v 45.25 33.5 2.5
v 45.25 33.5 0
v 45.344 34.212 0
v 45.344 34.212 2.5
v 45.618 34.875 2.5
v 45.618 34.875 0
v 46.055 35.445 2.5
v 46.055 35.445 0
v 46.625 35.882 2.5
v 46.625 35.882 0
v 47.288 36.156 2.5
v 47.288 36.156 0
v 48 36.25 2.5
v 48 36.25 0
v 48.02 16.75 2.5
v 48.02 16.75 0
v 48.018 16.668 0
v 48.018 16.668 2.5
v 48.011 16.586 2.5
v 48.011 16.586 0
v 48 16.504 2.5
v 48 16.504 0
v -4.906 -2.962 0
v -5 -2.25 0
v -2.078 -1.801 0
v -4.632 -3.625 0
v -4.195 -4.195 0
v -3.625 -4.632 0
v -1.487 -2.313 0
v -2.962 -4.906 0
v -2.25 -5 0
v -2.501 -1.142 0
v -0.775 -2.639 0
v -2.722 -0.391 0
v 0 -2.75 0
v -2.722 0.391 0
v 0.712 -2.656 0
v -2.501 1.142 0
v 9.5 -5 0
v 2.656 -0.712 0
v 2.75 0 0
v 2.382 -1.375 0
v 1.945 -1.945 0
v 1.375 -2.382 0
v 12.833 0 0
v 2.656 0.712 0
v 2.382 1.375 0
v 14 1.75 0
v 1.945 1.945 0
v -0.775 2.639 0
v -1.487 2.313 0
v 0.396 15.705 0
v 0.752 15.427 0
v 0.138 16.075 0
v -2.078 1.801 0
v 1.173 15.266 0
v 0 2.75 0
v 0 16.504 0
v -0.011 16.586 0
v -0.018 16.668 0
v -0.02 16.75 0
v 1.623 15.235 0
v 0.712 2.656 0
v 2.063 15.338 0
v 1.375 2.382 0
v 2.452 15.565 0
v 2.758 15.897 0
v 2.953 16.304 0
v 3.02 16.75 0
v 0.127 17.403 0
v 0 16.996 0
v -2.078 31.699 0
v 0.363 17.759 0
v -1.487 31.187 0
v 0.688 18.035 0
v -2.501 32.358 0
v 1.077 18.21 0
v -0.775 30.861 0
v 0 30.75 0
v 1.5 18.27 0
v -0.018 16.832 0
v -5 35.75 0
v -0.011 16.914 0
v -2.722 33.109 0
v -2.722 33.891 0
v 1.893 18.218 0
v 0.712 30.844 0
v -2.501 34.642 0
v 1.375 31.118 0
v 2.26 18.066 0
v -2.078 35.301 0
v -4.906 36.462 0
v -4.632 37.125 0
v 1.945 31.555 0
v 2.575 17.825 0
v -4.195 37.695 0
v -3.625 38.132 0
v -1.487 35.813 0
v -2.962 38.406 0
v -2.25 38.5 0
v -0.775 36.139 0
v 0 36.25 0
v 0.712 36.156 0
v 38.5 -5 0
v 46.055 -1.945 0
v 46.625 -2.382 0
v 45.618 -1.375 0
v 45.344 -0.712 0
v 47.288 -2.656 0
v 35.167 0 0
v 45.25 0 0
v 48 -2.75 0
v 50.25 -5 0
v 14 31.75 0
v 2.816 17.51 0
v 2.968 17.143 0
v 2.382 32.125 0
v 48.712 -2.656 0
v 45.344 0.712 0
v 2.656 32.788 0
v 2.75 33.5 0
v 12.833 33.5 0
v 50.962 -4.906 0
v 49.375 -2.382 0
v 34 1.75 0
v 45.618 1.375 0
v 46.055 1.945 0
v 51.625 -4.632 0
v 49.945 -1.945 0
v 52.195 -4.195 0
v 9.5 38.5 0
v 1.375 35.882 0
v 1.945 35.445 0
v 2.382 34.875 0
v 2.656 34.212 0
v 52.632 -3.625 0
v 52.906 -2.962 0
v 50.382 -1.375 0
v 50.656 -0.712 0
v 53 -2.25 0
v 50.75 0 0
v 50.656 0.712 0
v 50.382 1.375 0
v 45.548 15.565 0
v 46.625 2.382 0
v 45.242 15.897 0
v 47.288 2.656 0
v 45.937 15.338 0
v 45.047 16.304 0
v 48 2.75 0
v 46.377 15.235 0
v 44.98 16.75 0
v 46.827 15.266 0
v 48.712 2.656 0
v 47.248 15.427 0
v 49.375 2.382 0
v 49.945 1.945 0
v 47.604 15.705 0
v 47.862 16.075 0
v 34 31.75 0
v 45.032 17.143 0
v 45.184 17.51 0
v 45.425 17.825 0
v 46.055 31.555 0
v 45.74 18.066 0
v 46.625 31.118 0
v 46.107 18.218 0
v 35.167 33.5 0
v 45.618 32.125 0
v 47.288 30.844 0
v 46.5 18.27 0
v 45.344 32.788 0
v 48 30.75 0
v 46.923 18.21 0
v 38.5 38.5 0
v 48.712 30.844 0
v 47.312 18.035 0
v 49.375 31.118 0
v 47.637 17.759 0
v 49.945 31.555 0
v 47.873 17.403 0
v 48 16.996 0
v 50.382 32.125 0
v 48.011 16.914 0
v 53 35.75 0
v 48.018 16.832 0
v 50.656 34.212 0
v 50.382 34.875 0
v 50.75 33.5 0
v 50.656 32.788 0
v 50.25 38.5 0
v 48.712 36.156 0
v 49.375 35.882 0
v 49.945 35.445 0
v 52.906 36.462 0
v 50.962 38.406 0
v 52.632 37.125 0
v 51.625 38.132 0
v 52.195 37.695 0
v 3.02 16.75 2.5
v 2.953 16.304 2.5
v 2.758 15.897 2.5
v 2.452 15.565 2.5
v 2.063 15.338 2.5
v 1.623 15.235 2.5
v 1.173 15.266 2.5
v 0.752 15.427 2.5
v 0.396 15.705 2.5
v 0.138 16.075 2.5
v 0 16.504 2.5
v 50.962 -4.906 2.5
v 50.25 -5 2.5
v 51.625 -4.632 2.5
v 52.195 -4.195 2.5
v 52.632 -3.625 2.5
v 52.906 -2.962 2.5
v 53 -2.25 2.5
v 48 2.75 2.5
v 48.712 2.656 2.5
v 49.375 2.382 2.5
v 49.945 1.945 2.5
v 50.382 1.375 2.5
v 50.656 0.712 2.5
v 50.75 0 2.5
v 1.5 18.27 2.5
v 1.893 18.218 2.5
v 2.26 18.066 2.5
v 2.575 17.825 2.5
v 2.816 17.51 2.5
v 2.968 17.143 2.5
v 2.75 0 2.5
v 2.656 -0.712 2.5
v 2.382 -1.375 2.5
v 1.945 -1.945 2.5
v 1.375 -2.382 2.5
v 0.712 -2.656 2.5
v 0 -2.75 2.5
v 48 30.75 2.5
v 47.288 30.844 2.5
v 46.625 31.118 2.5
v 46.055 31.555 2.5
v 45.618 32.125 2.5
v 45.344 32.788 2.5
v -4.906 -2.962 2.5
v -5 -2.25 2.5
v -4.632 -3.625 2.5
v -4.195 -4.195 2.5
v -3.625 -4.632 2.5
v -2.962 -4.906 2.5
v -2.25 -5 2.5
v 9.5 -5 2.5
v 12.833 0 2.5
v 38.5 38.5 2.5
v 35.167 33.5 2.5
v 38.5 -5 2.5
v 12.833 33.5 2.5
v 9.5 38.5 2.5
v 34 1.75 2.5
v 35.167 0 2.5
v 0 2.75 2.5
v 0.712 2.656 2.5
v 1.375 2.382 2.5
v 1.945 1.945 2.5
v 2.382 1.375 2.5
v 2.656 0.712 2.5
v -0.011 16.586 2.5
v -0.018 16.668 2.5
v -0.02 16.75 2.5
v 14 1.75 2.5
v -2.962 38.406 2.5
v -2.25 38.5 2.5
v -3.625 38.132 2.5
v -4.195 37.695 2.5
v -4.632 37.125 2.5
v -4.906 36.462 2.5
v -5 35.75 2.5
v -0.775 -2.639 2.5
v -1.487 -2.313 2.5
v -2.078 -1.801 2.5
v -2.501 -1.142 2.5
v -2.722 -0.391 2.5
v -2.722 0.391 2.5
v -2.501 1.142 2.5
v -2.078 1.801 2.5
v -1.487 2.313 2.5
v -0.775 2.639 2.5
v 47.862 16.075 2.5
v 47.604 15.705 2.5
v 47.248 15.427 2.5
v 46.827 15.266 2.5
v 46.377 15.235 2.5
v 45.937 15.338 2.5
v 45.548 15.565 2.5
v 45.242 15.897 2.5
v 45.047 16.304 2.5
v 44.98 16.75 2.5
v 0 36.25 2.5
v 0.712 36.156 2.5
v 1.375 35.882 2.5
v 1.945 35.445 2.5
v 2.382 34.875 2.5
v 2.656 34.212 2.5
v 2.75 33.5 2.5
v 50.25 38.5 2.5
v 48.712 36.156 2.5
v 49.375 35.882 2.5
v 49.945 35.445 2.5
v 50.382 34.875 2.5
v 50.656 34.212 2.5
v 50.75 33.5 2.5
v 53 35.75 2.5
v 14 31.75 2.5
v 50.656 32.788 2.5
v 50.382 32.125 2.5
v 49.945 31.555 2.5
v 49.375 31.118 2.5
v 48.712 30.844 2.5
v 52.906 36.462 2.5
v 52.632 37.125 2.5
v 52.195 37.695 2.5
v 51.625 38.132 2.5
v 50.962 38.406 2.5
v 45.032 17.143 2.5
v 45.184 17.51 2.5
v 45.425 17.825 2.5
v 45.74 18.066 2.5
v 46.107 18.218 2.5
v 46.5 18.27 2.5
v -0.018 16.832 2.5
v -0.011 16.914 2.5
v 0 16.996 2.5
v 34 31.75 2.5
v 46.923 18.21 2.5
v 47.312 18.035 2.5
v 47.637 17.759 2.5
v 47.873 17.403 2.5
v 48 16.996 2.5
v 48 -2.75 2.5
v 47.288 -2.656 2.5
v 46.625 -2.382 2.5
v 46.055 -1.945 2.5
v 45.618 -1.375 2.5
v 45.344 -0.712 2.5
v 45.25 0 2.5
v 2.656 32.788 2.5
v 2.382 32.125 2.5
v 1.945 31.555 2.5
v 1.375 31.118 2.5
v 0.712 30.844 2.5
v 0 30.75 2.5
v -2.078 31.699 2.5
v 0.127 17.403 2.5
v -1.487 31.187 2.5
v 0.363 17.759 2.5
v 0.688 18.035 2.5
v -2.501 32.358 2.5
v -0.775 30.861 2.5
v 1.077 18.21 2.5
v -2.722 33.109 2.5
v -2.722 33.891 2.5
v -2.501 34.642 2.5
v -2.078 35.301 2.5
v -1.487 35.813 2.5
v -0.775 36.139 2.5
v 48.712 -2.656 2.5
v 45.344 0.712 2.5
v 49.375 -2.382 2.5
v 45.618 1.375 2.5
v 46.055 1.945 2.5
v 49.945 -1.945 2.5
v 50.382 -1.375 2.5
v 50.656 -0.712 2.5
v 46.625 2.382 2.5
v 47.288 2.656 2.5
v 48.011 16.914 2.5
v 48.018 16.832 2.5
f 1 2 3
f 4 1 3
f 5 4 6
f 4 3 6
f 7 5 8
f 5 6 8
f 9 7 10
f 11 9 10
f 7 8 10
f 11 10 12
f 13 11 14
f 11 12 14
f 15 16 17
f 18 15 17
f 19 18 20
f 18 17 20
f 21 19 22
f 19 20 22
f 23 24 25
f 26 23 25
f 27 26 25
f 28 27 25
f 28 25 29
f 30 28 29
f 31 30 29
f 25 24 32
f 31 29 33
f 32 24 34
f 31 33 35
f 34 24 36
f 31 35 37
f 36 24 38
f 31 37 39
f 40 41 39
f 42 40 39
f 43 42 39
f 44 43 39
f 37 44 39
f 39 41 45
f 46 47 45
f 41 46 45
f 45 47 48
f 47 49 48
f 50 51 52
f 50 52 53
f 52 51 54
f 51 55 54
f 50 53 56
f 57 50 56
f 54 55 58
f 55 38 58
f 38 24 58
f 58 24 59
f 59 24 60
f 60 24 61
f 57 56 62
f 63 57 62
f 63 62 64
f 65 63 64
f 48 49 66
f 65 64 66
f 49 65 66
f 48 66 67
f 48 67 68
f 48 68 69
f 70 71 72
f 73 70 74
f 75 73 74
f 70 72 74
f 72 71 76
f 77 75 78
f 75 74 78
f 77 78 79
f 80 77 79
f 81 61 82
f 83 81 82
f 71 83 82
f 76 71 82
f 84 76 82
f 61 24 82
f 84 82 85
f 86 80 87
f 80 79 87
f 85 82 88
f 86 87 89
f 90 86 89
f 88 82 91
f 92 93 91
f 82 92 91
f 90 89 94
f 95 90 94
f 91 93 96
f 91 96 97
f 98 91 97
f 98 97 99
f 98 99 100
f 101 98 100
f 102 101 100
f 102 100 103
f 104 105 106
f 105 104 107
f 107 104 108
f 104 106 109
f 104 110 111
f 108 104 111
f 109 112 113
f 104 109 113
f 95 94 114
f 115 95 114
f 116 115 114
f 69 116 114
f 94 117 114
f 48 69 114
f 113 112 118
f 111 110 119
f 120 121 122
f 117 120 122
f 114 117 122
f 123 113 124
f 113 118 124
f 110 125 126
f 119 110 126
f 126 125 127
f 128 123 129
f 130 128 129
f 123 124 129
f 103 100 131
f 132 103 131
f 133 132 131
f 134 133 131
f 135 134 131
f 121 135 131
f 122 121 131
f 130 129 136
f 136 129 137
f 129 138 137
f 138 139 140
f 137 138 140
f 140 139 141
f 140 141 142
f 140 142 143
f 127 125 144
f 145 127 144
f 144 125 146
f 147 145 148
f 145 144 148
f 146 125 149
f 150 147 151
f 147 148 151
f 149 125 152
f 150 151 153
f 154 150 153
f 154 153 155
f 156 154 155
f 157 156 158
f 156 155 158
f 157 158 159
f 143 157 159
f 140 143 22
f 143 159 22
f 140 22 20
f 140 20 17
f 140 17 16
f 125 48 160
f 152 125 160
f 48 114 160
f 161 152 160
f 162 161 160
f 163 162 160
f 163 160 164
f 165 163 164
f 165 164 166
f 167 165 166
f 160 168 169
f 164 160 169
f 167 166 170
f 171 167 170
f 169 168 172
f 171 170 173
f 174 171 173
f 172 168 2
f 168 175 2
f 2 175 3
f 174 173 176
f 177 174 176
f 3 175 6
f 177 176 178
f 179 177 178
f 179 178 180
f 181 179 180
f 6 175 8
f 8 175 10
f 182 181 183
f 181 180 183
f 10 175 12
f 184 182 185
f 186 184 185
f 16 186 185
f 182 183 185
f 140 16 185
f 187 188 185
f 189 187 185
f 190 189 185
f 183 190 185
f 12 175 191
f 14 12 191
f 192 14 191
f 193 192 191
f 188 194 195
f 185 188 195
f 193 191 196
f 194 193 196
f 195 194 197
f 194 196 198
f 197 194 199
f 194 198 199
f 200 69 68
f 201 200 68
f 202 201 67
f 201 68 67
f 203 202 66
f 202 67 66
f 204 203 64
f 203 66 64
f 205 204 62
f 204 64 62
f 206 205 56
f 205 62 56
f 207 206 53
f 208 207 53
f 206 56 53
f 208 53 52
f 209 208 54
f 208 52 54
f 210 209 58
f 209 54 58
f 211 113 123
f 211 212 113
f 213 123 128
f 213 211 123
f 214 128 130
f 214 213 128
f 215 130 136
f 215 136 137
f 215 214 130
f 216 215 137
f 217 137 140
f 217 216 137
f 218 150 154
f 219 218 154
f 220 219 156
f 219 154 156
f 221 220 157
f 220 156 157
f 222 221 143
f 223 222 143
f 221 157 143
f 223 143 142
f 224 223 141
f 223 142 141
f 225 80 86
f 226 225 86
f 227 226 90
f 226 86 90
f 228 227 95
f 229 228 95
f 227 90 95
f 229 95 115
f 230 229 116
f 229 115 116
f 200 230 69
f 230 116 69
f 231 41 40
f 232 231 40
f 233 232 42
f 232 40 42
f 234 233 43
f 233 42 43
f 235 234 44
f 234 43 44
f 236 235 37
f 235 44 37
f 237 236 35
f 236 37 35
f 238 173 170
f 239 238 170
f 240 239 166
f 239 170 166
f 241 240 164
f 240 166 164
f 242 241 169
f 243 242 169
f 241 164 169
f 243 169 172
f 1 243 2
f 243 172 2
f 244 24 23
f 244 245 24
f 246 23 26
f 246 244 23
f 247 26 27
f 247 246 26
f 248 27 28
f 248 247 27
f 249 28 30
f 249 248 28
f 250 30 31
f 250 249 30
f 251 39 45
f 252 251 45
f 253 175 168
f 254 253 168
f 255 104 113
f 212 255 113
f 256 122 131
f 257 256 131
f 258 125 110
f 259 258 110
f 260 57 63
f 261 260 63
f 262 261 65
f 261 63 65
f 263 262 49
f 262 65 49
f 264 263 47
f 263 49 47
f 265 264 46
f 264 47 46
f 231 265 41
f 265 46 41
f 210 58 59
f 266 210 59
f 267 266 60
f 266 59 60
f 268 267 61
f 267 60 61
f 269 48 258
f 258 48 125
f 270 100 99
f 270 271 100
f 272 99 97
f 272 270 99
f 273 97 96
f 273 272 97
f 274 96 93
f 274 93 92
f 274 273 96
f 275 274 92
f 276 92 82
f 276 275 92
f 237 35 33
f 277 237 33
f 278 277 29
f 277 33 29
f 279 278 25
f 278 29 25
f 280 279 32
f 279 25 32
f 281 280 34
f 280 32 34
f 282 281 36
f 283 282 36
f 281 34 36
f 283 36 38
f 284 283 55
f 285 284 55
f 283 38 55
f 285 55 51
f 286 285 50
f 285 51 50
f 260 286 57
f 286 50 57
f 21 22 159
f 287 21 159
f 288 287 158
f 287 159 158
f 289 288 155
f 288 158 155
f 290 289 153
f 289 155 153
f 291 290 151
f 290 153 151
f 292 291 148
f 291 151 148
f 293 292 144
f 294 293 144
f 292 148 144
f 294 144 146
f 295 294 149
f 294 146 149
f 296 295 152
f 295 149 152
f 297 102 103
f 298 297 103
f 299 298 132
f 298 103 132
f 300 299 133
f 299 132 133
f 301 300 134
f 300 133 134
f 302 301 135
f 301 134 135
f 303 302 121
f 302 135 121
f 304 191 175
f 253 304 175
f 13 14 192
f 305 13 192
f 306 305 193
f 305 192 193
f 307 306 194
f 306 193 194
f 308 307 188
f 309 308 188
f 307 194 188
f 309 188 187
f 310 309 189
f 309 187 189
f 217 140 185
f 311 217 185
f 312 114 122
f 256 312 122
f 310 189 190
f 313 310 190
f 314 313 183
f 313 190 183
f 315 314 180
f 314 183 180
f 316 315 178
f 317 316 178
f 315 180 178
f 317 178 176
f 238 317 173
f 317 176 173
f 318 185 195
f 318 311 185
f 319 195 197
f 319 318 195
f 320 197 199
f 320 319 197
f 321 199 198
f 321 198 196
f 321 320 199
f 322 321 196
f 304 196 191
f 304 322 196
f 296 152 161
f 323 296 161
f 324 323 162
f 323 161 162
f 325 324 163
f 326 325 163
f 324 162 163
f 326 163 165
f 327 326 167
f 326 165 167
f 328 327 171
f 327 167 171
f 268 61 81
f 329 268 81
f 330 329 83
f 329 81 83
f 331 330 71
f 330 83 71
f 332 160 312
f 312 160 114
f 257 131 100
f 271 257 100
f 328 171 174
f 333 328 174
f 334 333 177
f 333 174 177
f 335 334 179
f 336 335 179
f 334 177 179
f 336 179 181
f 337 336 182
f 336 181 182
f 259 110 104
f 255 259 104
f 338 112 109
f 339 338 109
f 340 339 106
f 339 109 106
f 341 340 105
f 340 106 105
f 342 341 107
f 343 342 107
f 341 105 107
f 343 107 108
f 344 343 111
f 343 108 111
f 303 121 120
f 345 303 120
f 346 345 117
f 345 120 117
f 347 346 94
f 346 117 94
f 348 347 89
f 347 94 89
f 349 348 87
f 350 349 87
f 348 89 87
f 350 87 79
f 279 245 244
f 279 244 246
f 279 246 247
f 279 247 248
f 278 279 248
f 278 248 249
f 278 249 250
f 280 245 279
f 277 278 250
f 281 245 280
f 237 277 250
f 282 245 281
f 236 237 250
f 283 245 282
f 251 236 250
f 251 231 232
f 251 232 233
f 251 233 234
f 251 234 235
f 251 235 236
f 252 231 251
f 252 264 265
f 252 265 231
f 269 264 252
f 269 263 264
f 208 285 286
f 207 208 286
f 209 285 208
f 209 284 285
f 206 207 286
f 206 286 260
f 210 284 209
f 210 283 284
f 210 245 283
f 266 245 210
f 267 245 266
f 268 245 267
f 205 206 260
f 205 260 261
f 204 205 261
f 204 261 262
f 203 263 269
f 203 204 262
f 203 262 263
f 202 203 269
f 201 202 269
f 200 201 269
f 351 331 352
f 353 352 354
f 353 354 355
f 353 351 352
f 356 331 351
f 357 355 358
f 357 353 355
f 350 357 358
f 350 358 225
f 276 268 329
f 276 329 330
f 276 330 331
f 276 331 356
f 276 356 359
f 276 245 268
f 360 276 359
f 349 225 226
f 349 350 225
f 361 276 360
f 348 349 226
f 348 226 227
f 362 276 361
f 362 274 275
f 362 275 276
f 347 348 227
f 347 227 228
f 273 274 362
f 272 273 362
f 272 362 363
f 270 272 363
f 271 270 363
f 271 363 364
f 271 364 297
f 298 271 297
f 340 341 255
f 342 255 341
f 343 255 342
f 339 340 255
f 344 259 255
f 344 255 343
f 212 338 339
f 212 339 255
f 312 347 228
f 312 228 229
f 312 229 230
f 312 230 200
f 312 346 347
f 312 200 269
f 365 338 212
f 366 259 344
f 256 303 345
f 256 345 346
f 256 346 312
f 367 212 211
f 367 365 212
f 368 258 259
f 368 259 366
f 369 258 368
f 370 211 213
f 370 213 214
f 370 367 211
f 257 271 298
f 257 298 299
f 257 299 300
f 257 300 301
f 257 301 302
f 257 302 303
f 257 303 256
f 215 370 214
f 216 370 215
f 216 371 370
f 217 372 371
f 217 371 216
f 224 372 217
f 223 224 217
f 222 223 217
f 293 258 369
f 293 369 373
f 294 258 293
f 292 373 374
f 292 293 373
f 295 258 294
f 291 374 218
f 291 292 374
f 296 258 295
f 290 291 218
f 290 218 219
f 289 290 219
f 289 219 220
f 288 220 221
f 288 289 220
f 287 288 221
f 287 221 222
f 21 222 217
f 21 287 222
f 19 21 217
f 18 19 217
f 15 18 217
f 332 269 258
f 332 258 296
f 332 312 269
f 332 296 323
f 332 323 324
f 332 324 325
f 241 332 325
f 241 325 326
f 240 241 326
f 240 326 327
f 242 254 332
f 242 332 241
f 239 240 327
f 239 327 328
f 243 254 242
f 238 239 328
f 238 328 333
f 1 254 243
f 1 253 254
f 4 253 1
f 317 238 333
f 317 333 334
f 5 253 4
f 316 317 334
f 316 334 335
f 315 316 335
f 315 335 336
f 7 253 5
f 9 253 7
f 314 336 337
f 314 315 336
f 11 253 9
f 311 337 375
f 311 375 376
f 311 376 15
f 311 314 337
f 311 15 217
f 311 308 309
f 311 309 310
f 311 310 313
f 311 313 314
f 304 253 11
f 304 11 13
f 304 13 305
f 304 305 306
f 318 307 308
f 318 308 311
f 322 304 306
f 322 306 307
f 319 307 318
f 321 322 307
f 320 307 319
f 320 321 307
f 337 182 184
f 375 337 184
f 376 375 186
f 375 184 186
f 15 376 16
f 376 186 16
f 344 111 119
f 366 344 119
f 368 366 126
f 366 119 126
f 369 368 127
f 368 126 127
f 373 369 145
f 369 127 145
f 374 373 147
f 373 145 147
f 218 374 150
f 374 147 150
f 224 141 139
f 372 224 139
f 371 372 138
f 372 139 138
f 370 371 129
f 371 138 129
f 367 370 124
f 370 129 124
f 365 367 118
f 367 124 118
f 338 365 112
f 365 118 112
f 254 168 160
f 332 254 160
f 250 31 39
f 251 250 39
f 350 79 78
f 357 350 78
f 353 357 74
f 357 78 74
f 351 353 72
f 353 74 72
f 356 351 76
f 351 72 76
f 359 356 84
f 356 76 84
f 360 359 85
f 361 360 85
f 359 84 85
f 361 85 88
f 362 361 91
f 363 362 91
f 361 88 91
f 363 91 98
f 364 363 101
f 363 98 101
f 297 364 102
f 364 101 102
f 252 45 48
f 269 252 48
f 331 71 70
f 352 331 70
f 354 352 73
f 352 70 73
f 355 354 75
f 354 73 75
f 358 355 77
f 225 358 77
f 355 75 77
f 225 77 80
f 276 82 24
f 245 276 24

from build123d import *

# Parameters (mm, degrees)
BOSS_EXTRUDE1_DEPTH = 2.5
FILLET1_R           = 2.75


with BuildPart() as part:
    # Sketch1 → Boss-Extrude1 (new body)
    with BuildSketch(Plane.XY):
        with BuildLine():
            ThreePointArc((0, 16.504235885), (-0.014991749, 16.62671172), (-0.02, 16.75))
            Line((-0.02, 16.75), (-5, 16.75))
            Line((-5, 16.75), (-5, -5))
            Line((-5, -5), (9.5, -5))
            Line((9.5, -5), (12.833333333, 0))
            Line((12.833333333, 0), (2.75, 0))
            ThreePointArc((2.75, 0), (1.944543648, -1.944543648), (0, -2.75))
            ThreePointArc((0, -2.75), (-2.75, 0), (0, 2.75))
            Line((0, 2.75), (0, 16.504235885))
        make_face()
        with BuildLine():
            ThreePointArc((0, 30.75), (-2.75, 33.5), (0, 36.25))
            ThreePointArc((0, 36.25), (1.944543648, 35.444543648), (2.75, 33.5))
            Line((2.75, 33.5), (12.833333333, 33.5))
            Line((12.833333333, 33.5), (9.5, 38.5))
            Line((9.5, 38.5), (-5, 38.5))
            Line((-5, 38.5), (-5, 16.75))
            Line((-5, 16.75), (-0.02, 16.75))
            ThreePointArc((-0.02, 16.75), (-0.014991749, 16.87328828), (0, 16.995764115))
            Line((0, 16.995764115), (0, 30.75))
        make_face()
        with BuildLine():
            ThreePointArc((2.75, 33.5), (1.944543648, 31.555456352), (0, 30.75))
            Line((0, 30.75), (0, 16.995764115))
            ThreePointArc((0, 16.995764115), (0.51591704, 17.908438918), (1.5, 18.27))
            ThreePointArc((1.5, 18.27), (2.574802307, 17.824802307), (3.02, 16.75))
            Line((3.02, 16.75), (24, 16.75))
            Line((24, 16.75), (24, 31.75))
            Line((24, 31.75), (14, 31.75))
            Line((14, 31.75), (12.833333333, 33.5))
            Line((12.833333333, 33.5), (2.75, 33.5))
        make_face()
        with BuildLine():
            Line((45.25, 33.5), (35.166666667, 33.5))
            Line((35.166666667, 33.5), (34, 31.75))
            Line((34, 31.75), (24, 31.75))
            Line((24, 31.75), (24, 16.75))
            Line((24, 16.75), (44.98, 16.75))
            ThreePointArc((44.98, 16.75), (45.425197693, 17.824802307), (46.5, 18.27))
            ThreePointArc((46.5, 18.27), (47.48408296, 17.908438918), (48, 16.995764115))
            Line((48, 16.995764115), (48, 30.75))
            ThreePointArc((48, 30.75), (46.055456352, 31.555456352), (45.25, 33.5))
        make_face()
        with BuildLine():
            Line((38.5, 38.5), (35.166666667, 33.5))
            Line((35.166666667, 33.5), (45.25, 33.5))
            ThreePointArc((45.25, 33.5), (46.055456352, 35.444543648), (48, 36.25))
            ThreePointArc((48, 36.25), (49.944543648, 35.444543648), (50.75, 33.5))
            ThreePointArc((50.75, 33.5), (49.944543648, 31.555456352), (48, 30.75))
            Line((48, 30.75), (48, 16.995764115))
            ThreePointArc((48, 16.995764115), (48.014991749, 16.87328828), (48.02, 16.75))
            Line((48.02, 16.75), (53, 16.75))
            Line((53, 16.75), (53, 38.5))
            Line((53, 38.5), (38.5, 38.5))
        make_face()
        with BuildLine():
            ThreePointArc((48.02, 16.75), (48.014991749, 16.62671172), (48, 16.504235885))
            Line((48, 16.504235885), (48, 2.75))
            ThreePointArc((48, 2.75), (49.944543648, 1.944543648), (50.75, 0))
            ThreePointArc((50.75, 0), (49.944543648, -1.944543648), (48, -2.75))
            ThreePointArc((48, -2.75), (46.055456352, -1.944543648), (45.25, 0))
            Line((45.25, 0), (35.166666667, 0))
            Line((35.166666667, 0), (38.5, -5))
            Line((38.5, -5), (53, -5))
            Line((53, -5), (53, 16.75))
            Line((53, 16.75), (48.02, 16.75))
        make_face()
        with BuildLine():
            Line((44.98, 16.75), (24, 16.75))
            Line((24, 16.75), (24, 1.75))
            Line((24, 1.75), (34, 1.75))
            Line((34, 1.75), (35.166666667, 0))
            Line((35.166666667, 0), (45.25, 0))
            ThreePointArc((45.25, 0), (46.055456352, 1.944543648), (48, 2.75))
            Line((48, 2.75), (48, 16.504235885))
            ThreePointArc((48, 16.504235885), (46.37671172, 15.235008251), (44.98, 16.75))
        make_face()
        with BuildLine():
            ThreePointArc((3.02, 16.75), (1.62328828, 15.235008251), (0, 16.504235885))
            Line((0, 16.504235885), (0, 2.75))
            ThreePointArc((0, 2.75), (1.944543648, 1.944543648), (2.75, 0))
            Line((2.75, 0), (12.833333333, 0))
            Line((12.833333333, 0), (14, 1.75))
            Line((14, 1.75), (24, 1.75))
            Line((24, 1.75), (24, 16.75))
            Line((24, 16.75), (3.02, 16.75))
        make_face()
    extrude(amount=BOSS_EXTRUDE1_DEPTH)

    # Fillet1
    fillet1_edges = [part.edges().sort_by_distance(p)[0] for p in [
        (53, -5, 1.25),
        (-5, -5, 1.25),
        (-5, 38.5, 1.25),
        (53, 38.5, 1.25),
    ]]
    fillet(fillet1_edges, radius=FILLET1_R)


solid = part.part
